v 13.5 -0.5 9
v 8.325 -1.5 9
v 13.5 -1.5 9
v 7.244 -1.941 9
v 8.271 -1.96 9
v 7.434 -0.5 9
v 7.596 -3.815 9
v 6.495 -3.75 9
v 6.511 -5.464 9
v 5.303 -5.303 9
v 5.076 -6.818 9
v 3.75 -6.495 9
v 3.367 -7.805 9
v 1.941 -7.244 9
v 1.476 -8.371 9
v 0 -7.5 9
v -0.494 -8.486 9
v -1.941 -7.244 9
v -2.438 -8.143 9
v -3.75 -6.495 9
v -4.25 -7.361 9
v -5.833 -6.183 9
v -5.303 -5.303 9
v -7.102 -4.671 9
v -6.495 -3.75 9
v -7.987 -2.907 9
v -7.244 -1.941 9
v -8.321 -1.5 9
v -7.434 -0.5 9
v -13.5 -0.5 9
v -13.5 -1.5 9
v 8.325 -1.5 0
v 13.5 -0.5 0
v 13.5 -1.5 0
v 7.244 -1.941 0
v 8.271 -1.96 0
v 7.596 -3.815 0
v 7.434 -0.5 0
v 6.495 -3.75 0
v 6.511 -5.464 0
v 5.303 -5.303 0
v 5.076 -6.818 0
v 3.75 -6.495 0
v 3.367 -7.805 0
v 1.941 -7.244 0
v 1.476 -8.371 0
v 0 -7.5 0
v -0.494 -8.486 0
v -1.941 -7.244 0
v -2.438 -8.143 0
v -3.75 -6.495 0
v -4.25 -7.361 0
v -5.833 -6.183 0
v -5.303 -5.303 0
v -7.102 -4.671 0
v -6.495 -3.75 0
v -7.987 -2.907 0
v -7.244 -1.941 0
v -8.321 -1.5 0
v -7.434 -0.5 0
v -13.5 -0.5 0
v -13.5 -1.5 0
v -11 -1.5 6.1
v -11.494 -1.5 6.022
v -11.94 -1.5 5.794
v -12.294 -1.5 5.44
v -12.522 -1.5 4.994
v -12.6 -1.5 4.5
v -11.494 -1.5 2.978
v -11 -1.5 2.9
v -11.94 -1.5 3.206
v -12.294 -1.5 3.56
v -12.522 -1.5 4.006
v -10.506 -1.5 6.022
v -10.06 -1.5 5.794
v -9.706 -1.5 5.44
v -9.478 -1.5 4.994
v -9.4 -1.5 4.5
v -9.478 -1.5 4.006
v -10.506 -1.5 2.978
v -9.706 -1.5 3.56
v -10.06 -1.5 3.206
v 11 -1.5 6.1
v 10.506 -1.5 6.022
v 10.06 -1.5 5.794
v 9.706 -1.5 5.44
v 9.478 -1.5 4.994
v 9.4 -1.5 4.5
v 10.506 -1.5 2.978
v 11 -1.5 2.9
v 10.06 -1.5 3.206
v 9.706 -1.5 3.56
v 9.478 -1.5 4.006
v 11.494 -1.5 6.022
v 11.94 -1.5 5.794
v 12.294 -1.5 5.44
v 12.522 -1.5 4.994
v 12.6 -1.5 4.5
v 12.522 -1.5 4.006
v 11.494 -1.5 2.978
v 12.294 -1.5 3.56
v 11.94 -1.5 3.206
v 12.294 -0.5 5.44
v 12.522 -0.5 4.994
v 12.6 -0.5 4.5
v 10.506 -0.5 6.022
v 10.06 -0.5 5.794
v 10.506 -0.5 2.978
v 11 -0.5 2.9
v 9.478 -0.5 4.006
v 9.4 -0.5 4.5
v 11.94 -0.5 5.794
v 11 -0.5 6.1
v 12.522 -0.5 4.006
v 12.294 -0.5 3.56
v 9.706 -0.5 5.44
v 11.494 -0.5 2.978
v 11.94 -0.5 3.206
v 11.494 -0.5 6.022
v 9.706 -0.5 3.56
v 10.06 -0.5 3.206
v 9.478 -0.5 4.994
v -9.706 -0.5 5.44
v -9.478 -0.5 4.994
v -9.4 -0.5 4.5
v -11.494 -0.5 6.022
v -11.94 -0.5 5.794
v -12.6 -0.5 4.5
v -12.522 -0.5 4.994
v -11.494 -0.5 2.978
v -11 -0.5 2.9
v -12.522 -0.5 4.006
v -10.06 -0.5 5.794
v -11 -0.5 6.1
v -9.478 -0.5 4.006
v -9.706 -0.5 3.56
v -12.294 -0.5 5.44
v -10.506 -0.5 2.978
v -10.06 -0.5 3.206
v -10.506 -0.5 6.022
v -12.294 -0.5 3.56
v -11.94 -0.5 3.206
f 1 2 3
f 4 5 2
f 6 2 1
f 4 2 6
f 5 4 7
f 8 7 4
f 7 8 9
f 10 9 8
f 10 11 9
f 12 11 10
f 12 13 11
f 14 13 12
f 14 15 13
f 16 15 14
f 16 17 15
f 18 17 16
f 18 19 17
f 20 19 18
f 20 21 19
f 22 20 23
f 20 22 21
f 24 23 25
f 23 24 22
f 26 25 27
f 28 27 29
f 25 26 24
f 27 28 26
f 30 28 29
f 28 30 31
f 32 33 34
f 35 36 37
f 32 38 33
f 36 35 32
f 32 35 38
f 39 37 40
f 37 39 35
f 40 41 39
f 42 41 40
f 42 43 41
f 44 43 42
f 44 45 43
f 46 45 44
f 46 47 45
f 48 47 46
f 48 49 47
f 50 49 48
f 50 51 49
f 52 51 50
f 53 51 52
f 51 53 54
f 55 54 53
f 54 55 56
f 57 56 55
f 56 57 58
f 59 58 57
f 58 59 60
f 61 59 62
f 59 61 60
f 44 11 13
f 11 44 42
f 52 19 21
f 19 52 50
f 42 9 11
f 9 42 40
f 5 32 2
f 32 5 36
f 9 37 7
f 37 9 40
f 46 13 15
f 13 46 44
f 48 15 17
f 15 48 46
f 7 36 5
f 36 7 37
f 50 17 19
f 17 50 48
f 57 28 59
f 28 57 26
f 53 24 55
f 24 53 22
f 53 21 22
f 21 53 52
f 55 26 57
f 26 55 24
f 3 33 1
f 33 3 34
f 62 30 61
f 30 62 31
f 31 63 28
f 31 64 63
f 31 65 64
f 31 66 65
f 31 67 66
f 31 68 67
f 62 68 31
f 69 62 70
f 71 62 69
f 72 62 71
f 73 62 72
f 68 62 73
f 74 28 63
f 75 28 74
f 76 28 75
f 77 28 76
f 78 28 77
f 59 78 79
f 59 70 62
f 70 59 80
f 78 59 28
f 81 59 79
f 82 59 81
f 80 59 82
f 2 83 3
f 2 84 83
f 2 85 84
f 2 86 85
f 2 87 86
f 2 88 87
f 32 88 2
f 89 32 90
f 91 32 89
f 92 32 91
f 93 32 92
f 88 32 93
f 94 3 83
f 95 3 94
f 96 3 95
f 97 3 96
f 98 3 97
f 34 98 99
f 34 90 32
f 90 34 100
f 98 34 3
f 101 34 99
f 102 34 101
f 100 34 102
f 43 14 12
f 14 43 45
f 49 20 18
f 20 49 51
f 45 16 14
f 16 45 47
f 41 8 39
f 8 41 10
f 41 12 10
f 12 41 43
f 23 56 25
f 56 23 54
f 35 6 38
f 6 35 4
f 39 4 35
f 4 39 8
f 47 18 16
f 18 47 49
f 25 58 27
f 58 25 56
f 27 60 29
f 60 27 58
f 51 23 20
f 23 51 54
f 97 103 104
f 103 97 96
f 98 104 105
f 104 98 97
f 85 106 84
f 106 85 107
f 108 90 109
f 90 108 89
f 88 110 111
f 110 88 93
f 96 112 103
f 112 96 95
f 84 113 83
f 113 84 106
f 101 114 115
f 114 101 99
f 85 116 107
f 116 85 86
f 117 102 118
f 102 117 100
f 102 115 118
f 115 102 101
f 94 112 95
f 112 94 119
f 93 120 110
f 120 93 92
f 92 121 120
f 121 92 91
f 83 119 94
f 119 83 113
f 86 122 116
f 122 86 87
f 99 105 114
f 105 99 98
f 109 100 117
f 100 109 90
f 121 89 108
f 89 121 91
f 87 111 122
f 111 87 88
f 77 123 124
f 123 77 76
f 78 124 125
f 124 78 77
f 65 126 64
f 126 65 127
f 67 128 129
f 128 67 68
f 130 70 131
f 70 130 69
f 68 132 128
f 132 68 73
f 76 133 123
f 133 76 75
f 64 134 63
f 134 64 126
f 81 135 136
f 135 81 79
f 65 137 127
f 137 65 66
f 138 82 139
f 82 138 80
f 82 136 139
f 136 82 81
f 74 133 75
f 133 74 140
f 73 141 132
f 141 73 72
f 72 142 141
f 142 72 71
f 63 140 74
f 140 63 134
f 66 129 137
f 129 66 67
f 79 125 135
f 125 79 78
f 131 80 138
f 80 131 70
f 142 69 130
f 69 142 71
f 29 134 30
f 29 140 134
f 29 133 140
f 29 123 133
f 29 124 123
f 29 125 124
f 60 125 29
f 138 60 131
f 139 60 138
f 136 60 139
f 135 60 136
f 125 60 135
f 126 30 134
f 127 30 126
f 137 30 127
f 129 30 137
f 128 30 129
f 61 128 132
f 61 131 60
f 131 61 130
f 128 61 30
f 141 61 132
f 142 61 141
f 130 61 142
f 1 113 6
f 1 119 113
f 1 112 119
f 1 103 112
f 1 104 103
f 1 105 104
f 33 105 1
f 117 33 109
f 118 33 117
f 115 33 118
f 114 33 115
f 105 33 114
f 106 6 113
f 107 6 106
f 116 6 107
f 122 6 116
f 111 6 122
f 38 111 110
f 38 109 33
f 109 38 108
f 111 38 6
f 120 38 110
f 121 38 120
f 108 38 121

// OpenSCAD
module part() {
    difference() {
        union() {
            translate([-10,15/2, 0])
            cube([20, 1.5, 9]);
            cylinder(d = 17, h = 9);
            translate([-27/2,0.5, 0])
            cube([27, 1.5, 9]);
            translate([-27/2,-1.5, 0])
            cube([27, 1.5, 9]);
        }
        
        cylinder(d = 15, h = 40);
        
        translate([11,50,9/2])
        rotate([90,0,0])
        cylinder(d = 3.2, h=100, $fn=20);
        
        translate([-11,50,9/2])
        rotate([90,0,0])
        cylinder(d = 3.2, h=100, $fn=20);
    }
}

module part0() {
    difference() {
        part();
        
        translate([-50,-0.5,0])
        cube([100, 100, 100]);
    }
}

module part1() {
    difference() {
        part();
        
        rotate([0,0,180])
        translate([-50,-0.5,0])
        cube([100, 100, 100]);
    }
}

part0();
//part1();
